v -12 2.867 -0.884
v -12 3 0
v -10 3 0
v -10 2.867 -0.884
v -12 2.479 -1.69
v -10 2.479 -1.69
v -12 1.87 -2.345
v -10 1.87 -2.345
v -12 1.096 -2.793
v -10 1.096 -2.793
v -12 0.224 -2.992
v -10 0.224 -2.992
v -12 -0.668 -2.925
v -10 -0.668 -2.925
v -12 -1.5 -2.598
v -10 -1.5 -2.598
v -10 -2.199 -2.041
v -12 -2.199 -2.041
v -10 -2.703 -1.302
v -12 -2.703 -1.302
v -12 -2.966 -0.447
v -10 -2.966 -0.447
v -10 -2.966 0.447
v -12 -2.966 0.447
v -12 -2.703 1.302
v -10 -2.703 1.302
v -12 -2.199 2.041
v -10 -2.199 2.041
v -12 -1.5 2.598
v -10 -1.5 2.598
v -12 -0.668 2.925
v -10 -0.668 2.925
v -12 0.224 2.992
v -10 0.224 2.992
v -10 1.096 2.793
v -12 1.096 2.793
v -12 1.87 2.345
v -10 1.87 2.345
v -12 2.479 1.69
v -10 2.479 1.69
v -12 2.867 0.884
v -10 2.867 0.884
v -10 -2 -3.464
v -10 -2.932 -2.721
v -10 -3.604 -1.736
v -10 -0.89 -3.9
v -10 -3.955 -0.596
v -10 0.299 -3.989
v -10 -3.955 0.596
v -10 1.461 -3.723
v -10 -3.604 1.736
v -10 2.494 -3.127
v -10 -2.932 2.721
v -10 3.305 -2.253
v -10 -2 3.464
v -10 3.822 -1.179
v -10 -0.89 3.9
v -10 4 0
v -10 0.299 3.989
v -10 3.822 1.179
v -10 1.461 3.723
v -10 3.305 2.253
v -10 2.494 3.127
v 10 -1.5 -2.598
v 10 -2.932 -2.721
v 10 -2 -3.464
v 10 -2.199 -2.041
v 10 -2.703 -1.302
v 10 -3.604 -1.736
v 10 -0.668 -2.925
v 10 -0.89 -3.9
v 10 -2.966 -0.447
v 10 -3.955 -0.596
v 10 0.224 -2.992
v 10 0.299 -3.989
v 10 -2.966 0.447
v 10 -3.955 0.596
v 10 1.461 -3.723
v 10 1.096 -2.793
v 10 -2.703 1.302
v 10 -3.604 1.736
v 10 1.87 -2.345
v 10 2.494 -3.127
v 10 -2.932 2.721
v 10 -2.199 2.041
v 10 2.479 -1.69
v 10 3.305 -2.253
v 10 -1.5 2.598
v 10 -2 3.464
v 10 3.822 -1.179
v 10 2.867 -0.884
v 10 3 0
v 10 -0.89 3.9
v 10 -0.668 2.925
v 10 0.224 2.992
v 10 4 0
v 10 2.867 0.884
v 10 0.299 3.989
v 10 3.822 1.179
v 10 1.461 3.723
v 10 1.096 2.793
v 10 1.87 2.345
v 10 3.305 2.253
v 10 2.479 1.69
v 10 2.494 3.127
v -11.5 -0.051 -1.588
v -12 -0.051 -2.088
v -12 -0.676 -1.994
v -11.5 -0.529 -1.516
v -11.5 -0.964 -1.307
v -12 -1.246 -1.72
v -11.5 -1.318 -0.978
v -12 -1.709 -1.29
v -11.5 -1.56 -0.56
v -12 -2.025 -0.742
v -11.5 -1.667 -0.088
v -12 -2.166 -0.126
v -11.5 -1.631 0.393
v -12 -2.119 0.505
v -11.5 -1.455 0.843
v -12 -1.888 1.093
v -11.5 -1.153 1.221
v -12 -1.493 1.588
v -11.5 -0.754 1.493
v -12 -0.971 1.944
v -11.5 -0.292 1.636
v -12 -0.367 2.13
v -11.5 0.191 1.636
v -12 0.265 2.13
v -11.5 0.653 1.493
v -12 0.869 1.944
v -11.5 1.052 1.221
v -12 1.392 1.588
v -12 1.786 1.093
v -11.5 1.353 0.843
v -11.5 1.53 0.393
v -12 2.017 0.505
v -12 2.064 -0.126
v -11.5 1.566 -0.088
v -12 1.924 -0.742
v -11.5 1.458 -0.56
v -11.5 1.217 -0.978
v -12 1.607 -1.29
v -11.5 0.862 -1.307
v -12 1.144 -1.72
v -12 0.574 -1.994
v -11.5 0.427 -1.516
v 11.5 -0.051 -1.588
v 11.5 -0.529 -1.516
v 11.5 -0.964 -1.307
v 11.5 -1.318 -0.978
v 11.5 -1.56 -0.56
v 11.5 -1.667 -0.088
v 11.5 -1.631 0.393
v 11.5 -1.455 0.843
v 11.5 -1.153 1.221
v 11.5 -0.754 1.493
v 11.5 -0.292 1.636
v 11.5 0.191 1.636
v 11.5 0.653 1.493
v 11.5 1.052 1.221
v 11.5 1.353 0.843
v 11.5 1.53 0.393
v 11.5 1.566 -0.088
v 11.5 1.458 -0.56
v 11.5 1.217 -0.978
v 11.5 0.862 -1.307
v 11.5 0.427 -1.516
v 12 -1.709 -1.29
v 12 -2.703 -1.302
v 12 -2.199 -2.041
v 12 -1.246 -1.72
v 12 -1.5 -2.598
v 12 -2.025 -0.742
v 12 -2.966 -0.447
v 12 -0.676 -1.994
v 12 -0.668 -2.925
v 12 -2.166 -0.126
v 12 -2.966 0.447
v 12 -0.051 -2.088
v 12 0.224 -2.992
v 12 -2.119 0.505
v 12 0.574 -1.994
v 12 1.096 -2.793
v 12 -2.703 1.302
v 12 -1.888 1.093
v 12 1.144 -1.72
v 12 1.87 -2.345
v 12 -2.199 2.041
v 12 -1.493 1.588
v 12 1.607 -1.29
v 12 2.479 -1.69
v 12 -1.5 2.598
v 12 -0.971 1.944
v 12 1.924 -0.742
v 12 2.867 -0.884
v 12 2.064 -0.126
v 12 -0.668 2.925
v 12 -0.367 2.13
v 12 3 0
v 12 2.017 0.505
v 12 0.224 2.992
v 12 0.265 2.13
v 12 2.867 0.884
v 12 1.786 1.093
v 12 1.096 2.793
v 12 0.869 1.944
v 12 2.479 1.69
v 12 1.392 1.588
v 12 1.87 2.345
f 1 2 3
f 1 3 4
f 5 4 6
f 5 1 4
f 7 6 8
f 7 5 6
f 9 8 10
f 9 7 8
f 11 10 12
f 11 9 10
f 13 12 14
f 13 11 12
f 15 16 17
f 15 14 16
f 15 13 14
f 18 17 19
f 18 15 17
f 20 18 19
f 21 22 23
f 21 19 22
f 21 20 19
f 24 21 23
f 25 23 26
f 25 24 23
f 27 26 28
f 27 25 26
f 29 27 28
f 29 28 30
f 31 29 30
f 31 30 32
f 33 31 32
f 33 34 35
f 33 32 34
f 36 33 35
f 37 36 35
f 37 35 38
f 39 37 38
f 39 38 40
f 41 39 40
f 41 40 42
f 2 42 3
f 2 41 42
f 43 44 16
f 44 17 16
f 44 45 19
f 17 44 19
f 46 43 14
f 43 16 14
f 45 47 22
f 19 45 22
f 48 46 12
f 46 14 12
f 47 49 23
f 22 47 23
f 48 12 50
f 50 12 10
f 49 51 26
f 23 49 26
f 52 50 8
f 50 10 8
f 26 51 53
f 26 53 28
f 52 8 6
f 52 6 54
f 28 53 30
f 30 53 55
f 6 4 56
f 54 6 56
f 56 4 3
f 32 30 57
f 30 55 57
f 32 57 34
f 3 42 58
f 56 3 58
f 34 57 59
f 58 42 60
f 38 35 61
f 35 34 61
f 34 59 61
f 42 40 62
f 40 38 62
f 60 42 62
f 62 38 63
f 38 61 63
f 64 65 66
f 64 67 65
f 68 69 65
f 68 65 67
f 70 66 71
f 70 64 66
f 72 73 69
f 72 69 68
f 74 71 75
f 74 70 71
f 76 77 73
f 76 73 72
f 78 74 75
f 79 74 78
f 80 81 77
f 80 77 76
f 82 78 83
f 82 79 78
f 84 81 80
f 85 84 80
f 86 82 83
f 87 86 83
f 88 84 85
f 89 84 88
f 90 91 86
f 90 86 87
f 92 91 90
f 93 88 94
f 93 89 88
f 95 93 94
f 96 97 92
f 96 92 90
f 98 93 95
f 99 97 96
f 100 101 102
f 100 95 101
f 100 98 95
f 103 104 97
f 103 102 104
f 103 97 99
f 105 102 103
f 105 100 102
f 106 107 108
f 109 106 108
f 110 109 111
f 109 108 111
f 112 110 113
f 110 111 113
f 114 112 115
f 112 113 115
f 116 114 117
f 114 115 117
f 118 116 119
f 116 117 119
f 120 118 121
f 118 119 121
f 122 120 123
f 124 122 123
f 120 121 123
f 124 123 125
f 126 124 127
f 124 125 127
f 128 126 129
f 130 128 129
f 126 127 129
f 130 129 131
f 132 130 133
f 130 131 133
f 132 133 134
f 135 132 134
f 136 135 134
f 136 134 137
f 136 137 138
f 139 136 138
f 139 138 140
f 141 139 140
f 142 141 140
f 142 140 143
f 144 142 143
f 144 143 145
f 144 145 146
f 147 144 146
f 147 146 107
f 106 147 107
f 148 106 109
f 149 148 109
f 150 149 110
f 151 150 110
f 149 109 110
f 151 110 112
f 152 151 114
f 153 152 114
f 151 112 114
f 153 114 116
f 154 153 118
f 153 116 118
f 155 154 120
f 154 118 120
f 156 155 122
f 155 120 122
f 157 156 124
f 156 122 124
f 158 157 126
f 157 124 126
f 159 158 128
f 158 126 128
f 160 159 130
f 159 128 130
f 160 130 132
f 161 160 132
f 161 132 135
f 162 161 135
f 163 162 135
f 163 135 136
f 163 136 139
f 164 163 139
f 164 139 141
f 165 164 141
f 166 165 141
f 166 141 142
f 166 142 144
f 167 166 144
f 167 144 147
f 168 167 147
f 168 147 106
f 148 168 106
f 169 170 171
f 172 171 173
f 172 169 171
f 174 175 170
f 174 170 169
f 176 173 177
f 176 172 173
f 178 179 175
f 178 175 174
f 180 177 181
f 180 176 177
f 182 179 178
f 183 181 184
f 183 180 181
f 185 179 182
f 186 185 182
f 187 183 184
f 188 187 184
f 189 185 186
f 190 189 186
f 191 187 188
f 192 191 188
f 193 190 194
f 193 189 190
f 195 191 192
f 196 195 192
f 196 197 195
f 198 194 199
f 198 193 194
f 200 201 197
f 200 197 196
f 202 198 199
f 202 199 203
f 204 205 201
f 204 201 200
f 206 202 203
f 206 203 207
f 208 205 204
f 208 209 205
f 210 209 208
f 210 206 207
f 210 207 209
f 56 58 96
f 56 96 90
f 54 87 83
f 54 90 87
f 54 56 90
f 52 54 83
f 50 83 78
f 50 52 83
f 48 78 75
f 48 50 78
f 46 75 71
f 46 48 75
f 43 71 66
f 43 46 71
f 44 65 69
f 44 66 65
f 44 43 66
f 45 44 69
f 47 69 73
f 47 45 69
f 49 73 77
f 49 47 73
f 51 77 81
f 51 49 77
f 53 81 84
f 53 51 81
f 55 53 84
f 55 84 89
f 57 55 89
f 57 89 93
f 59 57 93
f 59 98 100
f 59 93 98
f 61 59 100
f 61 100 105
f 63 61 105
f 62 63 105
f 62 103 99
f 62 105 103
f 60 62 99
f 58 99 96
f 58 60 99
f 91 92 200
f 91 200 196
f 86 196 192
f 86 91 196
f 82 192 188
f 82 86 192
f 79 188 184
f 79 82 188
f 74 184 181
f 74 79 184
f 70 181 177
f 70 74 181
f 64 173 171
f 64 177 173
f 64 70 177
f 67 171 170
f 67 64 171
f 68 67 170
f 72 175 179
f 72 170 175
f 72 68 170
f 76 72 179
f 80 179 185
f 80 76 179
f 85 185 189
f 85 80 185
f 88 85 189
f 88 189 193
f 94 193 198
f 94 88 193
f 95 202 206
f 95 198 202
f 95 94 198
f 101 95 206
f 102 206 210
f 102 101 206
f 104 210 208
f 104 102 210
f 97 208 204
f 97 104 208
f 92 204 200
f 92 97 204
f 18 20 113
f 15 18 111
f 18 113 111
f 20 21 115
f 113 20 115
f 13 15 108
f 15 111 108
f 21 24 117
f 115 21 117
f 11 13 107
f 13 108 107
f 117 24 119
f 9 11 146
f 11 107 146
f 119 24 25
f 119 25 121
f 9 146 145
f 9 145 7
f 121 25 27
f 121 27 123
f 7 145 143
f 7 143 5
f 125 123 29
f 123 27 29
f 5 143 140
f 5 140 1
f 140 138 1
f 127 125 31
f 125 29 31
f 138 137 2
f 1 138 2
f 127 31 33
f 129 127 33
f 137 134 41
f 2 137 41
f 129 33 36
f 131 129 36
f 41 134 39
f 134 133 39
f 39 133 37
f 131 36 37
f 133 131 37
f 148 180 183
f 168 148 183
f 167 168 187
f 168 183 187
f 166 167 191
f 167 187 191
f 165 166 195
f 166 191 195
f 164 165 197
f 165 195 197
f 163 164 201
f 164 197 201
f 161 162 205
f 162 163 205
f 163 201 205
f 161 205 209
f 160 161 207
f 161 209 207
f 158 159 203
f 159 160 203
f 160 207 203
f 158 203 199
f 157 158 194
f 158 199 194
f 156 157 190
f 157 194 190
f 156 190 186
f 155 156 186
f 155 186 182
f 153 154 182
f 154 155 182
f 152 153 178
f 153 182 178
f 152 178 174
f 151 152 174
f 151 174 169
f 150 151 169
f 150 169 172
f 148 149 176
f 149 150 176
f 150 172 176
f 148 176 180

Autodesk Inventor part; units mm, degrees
ref_plane "YZ Plane" through (0, 0, 0) normal (1, 0, 0) x (0, 1, 0)
ref_plane "XZ Plane" through (0, 0, 0) normal (0, 1, 0) x (-1, 0, 0)
ref_plane "XY Plane" through (0, 0, 0) normal (0, 0, 1) x (1, 0, 0)
sketch "Sketch1" plane through (0, 0, 0) normal (0, 0, 1) x (1, 0, 0)
  line L0 (-12, 0) -> (12, 0)
  line L1 (12, 0) -> (12, 3)
  line L2 (12, 3) -> (10, 3)
  line L3 (10, 3) -> (10, 4)
  line L4 (10, 4) -> (-10, 4)
  line L5 (-10, 4) -> (-10, 3)
  line L6 (-10, 3) -> (-12, 3)
  line L7 (-12, 3) -> (-12, 0)
  point P0 (0, 0)
  point P1 (0, 0)
  dimension "d0" = 24
  dimension "d1" = 6
  dimension "d2" = 8
  dimension "d3" = 2
revolve "Revolution1" add sketch "Sketch1" angle 360 about axis through (-12, 0, 0) along (1, 0, 0)
sketch "Sketch2" plane through (12, 0, 0) normal (1, 0, 0) x (0, 0, -1)
  point P0 (0, 0)
  point P1 (-0.1005, -0.6753)
  point P2 (-0.0327, -0.0508)
hole "Hole1" at (12, -0.0508, 0.0327) direction (-1, 0, 0) diameter 3.242 end up to surface thread size "M4x0.7" class "6H" standard "ISO Metric profile"
chamfer "Chamfer1" distance 0.5 angle 45 2 edges at (12, -0.0508, 1.6537) (-12, -0.0508, 1.6537)
properties part number "BaseSupport" material "Steel, Mild"
